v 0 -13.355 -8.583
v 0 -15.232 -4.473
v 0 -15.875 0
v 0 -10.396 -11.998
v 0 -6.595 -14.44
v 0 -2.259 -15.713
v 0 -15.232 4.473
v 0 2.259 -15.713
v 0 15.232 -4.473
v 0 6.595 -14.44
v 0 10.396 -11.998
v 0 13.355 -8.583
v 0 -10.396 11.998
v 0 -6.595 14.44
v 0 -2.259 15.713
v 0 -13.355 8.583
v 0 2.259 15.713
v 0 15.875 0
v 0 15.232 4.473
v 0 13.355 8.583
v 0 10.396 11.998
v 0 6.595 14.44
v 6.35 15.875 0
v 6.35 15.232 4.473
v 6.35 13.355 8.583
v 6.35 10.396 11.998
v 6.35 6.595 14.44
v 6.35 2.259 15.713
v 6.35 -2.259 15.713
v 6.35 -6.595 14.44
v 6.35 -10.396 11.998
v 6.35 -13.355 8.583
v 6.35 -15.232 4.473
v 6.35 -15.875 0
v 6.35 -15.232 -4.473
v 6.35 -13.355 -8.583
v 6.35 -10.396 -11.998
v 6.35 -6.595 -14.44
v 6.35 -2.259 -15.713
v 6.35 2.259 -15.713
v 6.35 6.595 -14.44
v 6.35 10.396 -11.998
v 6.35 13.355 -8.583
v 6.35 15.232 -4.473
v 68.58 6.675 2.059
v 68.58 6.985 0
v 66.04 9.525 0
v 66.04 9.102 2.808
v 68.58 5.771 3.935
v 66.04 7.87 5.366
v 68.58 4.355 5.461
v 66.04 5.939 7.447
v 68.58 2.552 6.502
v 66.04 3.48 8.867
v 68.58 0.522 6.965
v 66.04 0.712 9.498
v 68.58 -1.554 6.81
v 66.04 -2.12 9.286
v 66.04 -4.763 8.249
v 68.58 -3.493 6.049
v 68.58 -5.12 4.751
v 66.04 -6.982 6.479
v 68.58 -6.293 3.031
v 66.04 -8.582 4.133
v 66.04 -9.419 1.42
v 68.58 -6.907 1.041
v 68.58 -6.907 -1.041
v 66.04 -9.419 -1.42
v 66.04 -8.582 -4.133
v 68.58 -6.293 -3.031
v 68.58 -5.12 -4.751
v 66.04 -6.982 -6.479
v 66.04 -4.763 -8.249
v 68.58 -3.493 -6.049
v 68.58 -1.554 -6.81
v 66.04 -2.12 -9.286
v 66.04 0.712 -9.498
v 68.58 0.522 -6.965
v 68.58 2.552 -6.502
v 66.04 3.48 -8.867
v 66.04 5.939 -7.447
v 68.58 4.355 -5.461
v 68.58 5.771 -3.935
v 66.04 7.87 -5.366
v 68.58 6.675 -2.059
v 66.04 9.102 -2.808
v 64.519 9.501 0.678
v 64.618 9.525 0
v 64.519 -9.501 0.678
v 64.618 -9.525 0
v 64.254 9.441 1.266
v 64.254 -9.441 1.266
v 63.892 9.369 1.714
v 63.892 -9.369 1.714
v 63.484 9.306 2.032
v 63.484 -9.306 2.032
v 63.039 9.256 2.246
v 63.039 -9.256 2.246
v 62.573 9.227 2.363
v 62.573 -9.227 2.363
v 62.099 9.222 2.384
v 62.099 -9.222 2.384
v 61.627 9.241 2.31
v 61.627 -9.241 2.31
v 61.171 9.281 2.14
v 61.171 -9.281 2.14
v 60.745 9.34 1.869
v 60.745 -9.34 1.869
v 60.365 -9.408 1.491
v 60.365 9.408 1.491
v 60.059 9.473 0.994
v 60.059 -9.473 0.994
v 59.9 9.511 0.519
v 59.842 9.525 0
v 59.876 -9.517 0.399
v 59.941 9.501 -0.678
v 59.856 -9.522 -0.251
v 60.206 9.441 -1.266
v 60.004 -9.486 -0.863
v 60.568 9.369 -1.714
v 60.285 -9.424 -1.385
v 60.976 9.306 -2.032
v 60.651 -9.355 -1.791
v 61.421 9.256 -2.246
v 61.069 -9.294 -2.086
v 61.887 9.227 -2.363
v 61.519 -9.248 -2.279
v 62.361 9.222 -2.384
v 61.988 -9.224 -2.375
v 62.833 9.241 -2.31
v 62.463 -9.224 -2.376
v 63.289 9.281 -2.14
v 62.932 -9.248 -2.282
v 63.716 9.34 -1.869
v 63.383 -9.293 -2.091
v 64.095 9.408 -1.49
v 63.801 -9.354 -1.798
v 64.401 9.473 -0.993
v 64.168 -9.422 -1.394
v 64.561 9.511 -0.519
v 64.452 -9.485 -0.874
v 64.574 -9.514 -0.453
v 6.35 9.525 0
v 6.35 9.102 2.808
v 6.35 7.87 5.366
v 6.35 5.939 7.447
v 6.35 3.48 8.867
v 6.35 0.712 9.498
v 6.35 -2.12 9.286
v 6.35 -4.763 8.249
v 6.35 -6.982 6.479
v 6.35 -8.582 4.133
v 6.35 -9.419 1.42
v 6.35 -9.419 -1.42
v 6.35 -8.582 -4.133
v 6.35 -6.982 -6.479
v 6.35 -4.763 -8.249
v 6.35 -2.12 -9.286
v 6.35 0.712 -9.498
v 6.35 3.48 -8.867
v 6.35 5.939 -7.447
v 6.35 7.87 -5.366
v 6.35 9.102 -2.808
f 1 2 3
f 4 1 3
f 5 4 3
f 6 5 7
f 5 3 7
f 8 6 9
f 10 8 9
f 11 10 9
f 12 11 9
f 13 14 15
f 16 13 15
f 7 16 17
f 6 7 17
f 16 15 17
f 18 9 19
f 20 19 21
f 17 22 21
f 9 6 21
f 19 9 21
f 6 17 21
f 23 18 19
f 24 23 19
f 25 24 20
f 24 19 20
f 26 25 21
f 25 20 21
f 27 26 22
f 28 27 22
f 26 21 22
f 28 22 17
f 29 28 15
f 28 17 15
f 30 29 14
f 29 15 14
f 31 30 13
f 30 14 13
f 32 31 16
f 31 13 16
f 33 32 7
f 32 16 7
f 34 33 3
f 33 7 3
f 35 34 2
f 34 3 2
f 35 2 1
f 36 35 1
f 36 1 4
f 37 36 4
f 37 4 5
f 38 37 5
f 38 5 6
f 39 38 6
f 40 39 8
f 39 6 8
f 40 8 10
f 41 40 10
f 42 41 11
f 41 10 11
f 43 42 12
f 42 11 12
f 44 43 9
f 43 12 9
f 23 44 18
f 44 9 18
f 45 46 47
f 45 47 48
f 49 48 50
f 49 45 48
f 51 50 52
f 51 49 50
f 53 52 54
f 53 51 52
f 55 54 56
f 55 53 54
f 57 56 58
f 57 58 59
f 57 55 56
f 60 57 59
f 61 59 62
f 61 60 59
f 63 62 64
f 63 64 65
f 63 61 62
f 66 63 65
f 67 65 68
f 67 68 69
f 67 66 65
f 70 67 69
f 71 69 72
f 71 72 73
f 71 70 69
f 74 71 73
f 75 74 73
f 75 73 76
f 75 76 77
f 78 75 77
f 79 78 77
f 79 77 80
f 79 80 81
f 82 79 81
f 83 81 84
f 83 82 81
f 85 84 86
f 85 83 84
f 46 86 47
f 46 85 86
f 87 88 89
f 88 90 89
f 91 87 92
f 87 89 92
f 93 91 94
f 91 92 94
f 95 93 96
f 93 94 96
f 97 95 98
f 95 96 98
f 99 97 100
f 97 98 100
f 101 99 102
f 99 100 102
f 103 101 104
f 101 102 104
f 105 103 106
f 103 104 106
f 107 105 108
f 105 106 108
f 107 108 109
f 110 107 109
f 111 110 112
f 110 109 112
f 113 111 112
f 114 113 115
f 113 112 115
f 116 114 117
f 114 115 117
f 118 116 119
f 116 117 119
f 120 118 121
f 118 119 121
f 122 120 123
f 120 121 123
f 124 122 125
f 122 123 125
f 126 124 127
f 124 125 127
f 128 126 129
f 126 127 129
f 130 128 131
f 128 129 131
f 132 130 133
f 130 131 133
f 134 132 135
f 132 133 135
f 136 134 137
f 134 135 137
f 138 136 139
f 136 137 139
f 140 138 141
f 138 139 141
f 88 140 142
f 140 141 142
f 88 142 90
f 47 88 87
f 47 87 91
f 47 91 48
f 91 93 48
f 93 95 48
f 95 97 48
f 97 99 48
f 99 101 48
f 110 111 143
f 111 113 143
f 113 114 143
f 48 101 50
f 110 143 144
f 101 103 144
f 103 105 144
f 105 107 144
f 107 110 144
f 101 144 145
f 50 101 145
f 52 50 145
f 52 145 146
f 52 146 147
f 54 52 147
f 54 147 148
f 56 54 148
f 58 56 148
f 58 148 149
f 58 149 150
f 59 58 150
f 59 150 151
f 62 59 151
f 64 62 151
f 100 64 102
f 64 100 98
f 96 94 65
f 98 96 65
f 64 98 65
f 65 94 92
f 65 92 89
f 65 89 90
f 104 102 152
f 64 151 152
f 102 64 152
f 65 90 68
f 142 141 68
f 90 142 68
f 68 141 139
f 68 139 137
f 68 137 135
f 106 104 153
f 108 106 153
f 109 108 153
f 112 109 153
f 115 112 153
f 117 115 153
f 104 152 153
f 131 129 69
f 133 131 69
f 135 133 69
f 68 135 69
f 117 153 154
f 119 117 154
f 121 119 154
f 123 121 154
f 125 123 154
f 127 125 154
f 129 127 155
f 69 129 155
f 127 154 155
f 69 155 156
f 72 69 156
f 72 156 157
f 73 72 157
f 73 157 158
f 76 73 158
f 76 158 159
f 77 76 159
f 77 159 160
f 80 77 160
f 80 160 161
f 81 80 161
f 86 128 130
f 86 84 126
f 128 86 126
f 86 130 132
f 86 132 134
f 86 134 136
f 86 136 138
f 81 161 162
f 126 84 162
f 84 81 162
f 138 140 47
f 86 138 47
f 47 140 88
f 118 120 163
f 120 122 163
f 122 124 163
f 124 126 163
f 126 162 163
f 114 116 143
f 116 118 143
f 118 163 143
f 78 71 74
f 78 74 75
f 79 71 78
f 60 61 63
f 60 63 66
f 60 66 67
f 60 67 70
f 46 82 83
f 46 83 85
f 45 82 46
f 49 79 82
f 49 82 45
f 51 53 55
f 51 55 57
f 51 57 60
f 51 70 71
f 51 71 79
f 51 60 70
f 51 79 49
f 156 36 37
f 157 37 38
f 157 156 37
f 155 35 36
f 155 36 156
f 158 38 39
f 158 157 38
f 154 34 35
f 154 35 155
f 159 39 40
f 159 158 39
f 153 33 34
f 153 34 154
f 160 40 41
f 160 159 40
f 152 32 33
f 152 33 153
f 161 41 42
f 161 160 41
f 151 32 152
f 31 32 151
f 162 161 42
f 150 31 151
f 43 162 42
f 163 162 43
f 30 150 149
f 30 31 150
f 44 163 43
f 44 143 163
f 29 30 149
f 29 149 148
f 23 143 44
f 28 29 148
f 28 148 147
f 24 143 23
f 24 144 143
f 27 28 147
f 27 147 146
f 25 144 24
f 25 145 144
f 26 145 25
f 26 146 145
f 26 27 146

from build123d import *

# Parameters (mm, degrees)
F0_R          = 15.875
F1_DEPTH      = 6.35
F2_R          = 9.525
F3_DEPTH      = 62.23
F4_SIZE       = 2.54
F5_R          = 2.3876
F6_DEPTH      = 15.876
F6_DEPTH_BACK = 25.4


with BuildPart() as f1:
    # F0 (on Right) → F1 (new body)
    with BuildSketch(Plane.YZ):
        Circle(F0_R)
    extrude(amount=F1_DEPTH)

    # F2 (on face) → F3 (join)
    with BuildSketch(Plane.YZ.offset(6.35)):
        Circle(F2_R)
    extrude(amount=F3_DEPTH)

    # F4
    f4_edges = [f1.edges().sort_by_distance(p)[0] for p in [
        (68.58, -9.525, 0),
    ]]
    chamfer(f4_edges, length=F4_SIZE)

    # F5 (on Front) → F6 (cut, two sides)
    with BuildSketch(Plane.XZ) as f6_sk:
        with Locations((62.23, 0)):
            Circle(F5_R)
    extrude(amount=-F6_DEPTH, mode=Mode.SUBTRACT)
    extrude(f6_sk.sketch, amount=F6_DEPTH_BACK, mode=Mode.SUBTRACT)


solid = f1.part
